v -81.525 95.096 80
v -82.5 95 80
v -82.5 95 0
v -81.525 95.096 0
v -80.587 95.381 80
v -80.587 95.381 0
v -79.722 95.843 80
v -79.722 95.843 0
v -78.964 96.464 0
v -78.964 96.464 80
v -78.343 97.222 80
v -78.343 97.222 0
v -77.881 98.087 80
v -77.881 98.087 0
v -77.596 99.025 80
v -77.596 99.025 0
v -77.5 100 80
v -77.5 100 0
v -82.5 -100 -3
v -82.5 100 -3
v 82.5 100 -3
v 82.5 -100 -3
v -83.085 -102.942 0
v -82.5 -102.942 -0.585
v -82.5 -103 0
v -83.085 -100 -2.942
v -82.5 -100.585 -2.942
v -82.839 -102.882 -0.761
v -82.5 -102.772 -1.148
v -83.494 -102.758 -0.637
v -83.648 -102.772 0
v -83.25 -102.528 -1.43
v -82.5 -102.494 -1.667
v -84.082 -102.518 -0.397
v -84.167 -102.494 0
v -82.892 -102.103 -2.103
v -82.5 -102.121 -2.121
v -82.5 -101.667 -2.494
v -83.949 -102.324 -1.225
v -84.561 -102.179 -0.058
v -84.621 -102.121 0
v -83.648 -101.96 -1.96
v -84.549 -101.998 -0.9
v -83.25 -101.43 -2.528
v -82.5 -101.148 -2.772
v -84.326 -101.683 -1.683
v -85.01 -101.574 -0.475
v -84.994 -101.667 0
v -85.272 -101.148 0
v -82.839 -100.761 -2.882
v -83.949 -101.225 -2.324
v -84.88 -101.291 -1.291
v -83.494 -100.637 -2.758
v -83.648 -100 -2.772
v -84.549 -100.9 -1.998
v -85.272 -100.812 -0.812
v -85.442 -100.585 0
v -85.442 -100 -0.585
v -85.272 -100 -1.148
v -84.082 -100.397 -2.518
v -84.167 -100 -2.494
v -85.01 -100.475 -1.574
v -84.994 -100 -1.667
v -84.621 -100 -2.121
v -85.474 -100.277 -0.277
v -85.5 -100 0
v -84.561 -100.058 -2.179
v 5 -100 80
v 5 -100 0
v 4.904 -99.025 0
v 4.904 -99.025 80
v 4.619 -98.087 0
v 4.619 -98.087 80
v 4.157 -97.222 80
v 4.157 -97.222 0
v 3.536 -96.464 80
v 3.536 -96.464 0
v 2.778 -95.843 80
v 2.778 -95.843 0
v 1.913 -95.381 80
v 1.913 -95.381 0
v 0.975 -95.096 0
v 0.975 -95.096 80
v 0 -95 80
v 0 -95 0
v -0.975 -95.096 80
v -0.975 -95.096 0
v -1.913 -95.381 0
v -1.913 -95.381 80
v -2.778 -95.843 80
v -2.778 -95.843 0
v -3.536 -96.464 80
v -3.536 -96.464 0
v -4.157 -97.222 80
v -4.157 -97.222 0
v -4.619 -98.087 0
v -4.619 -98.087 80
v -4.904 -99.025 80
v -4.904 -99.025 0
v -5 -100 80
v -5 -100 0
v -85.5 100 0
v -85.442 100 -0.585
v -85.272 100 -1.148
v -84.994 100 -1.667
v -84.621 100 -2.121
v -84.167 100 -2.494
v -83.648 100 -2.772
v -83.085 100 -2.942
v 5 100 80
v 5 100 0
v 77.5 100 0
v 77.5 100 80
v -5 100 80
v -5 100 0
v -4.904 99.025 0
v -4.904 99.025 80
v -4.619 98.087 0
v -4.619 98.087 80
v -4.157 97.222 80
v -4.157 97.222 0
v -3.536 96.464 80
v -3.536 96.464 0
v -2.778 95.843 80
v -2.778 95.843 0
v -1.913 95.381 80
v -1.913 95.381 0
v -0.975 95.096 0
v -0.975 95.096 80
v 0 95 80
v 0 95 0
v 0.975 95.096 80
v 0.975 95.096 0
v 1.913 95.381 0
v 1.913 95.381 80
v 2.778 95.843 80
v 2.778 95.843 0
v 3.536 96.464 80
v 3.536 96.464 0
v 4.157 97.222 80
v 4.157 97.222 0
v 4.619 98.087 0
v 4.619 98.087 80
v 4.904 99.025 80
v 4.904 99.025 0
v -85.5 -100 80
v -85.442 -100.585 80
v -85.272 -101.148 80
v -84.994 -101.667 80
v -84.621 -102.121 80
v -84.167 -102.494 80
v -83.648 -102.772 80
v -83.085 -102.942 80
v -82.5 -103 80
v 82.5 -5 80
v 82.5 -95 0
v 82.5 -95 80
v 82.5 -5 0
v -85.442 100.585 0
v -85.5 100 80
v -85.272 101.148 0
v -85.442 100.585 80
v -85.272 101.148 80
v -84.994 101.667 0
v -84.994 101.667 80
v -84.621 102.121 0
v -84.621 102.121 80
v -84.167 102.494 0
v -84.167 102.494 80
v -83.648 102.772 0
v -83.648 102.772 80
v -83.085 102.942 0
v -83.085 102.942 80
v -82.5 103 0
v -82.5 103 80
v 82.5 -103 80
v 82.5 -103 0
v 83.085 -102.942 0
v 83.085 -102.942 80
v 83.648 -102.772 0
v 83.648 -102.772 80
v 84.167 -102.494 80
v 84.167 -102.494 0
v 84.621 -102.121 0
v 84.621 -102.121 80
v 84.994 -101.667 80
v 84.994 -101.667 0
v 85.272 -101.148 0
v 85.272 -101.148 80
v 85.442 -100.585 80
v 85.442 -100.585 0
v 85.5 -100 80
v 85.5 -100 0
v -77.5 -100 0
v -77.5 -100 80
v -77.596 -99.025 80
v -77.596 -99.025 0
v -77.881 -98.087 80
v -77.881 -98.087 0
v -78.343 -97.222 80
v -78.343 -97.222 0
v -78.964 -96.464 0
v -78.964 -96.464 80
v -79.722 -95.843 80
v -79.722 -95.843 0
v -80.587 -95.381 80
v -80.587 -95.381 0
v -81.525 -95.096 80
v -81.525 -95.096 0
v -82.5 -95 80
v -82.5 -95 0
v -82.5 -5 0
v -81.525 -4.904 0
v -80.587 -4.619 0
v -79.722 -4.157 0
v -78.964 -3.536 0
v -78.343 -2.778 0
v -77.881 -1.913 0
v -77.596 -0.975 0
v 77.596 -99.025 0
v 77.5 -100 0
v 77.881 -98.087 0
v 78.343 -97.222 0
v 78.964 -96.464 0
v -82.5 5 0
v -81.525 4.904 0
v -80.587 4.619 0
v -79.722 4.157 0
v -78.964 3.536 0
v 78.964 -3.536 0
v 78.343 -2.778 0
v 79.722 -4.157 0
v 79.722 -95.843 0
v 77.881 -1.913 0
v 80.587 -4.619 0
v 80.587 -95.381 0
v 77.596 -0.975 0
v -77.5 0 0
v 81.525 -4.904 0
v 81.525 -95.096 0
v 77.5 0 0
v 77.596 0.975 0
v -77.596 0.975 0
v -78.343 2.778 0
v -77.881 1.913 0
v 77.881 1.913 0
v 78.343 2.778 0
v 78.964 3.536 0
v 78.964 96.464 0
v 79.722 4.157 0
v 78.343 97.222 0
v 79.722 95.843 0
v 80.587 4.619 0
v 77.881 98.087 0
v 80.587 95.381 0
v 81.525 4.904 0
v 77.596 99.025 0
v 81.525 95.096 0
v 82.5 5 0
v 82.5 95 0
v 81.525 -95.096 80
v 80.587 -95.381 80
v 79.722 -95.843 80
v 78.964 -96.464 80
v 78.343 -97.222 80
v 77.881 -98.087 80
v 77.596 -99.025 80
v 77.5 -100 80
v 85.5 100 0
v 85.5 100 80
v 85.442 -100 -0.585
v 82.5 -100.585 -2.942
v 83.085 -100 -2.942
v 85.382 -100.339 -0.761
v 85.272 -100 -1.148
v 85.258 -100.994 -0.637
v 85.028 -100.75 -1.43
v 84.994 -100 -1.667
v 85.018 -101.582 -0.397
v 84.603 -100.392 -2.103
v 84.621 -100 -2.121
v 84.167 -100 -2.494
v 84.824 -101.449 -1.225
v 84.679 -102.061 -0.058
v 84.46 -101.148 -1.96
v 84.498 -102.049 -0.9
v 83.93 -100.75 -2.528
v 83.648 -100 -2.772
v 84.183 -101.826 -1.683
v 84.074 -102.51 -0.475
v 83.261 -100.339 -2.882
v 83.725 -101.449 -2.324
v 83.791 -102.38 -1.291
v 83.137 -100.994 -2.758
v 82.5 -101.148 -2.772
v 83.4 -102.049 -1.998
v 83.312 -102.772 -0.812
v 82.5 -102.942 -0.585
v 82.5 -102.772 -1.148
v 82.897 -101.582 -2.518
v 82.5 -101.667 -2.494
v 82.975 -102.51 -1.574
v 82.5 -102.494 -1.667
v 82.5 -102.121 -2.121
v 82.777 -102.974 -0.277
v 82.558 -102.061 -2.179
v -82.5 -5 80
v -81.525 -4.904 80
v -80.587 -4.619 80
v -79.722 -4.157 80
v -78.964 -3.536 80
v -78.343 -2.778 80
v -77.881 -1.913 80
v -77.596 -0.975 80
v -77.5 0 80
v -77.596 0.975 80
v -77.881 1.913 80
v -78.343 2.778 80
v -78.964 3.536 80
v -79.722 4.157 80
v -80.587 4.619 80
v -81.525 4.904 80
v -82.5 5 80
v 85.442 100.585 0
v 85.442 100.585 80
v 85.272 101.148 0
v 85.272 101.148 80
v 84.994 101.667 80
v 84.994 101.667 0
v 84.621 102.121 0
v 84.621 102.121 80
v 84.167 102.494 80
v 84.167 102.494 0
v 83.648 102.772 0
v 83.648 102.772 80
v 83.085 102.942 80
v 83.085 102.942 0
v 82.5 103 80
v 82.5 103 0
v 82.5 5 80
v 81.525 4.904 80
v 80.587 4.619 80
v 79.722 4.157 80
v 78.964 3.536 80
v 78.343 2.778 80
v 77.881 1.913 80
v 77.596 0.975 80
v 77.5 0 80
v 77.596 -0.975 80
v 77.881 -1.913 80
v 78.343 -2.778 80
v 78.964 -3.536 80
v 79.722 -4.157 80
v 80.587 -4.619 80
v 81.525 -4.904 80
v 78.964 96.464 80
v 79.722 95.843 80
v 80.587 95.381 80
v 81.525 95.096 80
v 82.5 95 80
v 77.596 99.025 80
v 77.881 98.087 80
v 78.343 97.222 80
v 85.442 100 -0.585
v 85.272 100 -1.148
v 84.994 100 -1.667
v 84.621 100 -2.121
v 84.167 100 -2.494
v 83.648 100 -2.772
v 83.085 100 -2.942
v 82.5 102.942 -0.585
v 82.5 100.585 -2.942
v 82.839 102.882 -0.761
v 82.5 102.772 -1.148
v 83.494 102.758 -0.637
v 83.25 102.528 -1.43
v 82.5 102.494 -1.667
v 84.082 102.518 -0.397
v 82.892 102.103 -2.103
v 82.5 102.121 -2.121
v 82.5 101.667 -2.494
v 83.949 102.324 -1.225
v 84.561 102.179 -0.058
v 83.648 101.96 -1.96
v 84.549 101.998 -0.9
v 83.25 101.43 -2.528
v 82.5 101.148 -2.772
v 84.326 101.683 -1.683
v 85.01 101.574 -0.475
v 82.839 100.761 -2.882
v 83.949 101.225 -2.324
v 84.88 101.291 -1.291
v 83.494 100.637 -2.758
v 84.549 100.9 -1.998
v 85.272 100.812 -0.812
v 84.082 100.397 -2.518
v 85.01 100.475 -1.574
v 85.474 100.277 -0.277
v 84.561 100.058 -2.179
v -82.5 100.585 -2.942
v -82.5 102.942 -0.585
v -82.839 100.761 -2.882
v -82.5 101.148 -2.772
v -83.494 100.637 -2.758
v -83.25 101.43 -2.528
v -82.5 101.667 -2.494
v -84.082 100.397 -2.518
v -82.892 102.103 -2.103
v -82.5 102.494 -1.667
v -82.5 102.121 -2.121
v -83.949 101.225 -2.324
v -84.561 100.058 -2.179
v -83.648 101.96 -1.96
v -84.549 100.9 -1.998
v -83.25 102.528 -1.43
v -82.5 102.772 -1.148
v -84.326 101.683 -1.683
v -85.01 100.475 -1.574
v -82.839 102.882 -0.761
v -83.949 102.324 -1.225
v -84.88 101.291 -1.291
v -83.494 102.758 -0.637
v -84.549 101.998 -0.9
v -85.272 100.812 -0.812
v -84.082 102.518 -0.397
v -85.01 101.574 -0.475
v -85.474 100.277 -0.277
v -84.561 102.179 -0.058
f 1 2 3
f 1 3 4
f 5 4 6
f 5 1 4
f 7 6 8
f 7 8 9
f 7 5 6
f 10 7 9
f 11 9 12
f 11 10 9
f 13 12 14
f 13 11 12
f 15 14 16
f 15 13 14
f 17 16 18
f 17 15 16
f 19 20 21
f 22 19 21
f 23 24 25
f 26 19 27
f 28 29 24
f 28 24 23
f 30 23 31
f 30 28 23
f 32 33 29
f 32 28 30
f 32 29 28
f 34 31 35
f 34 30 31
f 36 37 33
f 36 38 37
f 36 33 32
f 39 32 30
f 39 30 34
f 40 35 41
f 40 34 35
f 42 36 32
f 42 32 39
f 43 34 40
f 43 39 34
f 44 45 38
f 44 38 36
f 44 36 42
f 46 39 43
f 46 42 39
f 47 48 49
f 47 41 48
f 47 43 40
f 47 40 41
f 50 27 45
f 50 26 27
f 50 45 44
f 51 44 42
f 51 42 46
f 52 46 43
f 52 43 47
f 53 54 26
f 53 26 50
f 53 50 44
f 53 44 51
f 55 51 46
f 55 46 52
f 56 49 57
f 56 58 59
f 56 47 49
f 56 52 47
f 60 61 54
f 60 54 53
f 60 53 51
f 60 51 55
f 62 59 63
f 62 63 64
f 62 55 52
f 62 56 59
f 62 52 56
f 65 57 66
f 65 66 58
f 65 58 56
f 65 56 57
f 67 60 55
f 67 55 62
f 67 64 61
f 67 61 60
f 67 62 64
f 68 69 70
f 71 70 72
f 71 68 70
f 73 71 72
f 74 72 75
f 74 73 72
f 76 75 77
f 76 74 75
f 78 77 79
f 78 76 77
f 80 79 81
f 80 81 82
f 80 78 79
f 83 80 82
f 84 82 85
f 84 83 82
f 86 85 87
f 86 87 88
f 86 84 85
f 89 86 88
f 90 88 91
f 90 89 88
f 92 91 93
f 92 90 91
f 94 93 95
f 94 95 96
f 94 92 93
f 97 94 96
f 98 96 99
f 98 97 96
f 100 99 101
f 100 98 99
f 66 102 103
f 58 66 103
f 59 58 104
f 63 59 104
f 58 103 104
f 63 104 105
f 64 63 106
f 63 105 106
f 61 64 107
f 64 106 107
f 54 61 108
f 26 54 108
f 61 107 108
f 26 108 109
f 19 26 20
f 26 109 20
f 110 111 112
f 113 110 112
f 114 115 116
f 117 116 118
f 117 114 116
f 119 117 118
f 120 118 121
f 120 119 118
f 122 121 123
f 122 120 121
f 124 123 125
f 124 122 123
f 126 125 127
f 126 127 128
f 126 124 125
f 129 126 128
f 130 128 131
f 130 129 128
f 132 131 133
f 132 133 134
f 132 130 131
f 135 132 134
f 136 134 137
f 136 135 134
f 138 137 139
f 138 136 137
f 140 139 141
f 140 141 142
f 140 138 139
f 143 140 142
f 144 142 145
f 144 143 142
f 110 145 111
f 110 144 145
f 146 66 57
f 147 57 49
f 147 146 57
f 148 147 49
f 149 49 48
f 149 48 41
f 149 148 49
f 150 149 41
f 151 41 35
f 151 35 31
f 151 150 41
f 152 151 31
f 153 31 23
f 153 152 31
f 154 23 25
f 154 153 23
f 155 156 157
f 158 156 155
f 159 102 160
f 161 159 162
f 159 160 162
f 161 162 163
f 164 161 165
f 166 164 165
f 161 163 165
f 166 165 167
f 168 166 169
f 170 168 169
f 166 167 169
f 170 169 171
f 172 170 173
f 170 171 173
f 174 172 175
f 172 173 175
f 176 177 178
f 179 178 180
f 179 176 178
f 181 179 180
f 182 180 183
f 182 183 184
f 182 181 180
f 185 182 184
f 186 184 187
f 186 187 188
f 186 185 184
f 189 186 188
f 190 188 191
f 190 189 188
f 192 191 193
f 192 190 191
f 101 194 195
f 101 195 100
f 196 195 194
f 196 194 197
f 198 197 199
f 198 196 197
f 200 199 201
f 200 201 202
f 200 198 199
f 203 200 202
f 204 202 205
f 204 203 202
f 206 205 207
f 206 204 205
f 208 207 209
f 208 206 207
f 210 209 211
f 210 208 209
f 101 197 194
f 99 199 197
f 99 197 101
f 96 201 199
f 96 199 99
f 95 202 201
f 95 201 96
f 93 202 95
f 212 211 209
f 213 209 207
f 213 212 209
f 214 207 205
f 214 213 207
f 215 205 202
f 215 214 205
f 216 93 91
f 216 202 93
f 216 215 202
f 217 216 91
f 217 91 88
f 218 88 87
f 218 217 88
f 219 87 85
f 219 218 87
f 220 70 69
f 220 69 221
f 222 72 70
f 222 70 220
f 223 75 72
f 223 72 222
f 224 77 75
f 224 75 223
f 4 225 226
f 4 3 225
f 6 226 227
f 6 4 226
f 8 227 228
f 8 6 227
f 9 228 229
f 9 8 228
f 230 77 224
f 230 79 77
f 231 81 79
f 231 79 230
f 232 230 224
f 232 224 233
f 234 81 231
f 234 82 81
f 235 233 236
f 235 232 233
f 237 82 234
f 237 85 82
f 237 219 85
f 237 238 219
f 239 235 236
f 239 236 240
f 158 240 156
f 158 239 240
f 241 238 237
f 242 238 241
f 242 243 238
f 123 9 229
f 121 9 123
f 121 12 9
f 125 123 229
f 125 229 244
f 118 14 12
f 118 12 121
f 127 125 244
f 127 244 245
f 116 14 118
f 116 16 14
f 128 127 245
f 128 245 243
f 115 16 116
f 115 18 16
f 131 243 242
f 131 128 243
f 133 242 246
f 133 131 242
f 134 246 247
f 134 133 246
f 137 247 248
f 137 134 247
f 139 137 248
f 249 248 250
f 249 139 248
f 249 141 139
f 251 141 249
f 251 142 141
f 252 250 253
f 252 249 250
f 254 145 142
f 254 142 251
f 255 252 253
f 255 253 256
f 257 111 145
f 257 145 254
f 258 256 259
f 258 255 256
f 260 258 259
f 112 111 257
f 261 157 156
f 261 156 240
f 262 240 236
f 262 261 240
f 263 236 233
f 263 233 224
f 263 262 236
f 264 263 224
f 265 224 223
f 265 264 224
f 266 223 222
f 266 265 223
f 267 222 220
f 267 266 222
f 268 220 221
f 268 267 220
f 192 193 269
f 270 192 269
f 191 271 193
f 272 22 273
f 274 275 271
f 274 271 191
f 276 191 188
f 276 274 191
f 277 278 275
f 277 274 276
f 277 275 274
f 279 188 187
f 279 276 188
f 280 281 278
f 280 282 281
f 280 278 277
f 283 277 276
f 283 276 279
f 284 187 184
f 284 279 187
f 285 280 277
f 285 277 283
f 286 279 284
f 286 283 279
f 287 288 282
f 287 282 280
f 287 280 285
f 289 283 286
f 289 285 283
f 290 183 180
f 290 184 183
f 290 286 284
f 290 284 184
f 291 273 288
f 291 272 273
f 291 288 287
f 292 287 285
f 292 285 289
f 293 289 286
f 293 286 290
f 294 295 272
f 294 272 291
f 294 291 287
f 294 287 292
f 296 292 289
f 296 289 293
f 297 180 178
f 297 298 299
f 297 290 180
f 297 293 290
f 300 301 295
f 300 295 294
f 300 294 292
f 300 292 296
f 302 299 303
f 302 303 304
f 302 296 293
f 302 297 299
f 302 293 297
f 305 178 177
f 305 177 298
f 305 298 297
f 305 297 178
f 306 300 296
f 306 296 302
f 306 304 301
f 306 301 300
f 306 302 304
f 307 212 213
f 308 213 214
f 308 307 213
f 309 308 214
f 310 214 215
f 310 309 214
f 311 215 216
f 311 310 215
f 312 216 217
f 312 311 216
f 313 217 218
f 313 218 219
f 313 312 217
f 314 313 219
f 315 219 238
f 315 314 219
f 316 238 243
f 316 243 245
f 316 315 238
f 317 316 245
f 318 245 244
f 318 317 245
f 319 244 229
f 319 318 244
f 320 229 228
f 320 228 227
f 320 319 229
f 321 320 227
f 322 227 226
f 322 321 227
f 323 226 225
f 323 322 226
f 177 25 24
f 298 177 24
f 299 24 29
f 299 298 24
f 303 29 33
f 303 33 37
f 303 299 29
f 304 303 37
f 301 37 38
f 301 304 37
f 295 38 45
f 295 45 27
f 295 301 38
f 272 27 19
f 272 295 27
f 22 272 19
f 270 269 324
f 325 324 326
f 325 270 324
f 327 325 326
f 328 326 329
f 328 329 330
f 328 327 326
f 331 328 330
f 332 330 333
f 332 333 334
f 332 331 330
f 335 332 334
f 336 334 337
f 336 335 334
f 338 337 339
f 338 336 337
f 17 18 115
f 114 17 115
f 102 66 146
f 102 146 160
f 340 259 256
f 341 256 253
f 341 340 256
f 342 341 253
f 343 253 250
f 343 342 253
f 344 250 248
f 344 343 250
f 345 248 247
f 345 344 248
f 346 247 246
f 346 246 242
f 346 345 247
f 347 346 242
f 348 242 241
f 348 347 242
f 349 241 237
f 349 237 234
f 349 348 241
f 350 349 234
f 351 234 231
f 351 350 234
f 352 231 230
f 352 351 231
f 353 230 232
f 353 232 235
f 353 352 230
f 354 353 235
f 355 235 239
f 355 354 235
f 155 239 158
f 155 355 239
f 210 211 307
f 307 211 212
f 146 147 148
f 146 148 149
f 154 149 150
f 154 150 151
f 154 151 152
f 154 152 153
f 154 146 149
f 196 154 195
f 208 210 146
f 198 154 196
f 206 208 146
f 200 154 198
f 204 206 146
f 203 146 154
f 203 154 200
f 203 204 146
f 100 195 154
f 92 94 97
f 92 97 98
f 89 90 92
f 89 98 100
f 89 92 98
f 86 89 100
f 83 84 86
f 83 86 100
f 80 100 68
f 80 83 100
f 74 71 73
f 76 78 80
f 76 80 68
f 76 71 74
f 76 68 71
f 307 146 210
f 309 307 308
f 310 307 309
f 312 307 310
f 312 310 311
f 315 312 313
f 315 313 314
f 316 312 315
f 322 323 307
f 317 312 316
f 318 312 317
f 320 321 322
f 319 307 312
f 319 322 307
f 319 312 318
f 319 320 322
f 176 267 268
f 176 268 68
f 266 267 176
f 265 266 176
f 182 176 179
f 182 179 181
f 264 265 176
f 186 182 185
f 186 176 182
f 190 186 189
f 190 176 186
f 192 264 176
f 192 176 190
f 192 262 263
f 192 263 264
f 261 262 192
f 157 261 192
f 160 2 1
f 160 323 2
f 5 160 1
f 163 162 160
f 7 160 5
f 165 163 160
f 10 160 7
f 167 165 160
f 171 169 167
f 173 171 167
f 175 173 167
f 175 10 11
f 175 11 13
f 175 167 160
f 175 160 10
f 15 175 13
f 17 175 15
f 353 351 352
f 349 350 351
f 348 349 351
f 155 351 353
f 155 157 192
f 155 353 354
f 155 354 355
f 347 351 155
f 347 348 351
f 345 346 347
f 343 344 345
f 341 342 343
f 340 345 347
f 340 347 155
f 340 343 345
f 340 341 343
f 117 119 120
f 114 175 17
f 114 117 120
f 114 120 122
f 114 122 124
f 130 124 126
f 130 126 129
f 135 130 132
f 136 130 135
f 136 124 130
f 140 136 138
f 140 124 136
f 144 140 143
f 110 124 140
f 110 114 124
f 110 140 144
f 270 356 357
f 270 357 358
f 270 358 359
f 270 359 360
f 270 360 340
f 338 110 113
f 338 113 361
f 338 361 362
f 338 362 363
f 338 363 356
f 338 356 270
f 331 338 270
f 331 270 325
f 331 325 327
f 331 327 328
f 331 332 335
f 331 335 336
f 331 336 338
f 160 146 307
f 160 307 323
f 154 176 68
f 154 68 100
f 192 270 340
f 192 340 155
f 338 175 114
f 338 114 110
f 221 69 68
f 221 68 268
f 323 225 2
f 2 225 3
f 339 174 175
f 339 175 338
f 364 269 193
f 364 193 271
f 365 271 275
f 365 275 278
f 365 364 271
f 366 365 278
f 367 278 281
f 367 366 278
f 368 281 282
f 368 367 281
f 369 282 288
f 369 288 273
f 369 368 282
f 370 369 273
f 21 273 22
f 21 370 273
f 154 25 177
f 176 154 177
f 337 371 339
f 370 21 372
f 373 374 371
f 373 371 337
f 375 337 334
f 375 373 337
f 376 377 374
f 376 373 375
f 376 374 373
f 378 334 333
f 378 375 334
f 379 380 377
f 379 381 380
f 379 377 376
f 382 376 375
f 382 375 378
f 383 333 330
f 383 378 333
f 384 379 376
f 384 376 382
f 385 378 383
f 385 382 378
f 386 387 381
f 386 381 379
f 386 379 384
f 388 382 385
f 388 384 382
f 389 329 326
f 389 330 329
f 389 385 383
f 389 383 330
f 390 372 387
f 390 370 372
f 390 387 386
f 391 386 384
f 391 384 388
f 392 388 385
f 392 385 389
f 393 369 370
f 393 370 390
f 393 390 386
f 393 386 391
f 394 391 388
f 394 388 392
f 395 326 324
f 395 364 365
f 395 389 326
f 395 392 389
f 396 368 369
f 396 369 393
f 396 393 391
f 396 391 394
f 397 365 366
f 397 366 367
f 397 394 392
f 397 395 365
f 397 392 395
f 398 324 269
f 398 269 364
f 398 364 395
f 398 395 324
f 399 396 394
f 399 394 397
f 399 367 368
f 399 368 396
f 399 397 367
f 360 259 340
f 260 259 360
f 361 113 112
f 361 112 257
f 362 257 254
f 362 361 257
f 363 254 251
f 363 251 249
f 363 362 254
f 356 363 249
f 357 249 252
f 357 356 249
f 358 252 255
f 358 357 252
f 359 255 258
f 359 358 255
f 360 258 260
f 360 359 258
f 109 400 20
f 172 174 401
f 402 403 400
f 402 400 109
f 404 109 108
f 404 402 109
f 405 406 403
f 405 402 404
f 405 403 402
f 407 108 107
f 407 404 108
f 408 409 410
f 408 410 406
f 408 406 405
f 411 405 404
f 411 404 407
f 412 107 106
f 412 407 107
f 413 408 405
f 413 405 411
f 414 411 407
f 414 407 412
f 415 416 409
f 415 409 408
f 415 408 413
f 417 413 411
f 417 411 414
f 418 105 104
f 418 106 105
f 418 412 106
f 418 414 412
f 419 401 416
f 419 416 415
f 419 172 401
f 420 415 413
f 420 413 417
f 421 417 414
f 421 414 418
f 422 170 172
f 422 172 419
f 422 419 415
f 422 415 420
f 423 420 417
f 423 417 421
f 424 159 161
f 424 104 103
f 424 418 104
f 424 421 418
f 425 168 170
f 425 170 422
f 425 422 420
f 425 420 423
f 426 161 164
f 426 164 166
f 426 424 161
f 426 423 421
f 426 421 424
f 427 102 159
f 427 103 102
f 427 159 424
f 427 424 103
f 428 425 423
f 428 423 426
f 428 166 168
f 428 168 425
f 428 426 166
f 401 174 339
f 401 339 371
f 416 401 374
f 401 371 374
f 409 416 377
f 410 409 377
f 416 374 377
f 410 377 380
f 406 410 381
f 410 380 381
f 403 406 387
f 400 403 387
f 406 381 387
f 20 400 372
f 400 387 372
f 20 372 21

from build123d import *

# Parameters (mm, degrees)
SKETCH002_W  = 165
SKETCH002_H  = 200
PAD_DEPTH    = 80
THICKNESS_T  = 3
PAD004_DEPTH = 80


with BuildPart() as part:
    # Sketch002 → Pad (new body)
    with BuildSketch(Plane.XY):
        Rectangle(SKETCH002_W, SKETCH002_H)
    extrude(amount=PAD_DEPTH)

    # Thickness
    thickness_openings = [part.faces().sort_by_distance(p)[0] for p in [
        (0, 0, 80),
    ]]
    offset(amount=THICKNESS_T, openings=thickness_openings)

    # Sketch006 → Pad004 (join)
    with BuildSketch(Plane.XY.offset(80)):
        with BuildLine():
            ThreePointArc((-82.5, 95), (-78.964466, 96.464466), (-77.5, 100))
            Line((-82.5, 100), (-77.5, 100))
            Line((-82.5, 95), (-82.5, 100))
        make_face()
        with BuildLine():
            ThreePointArc((77.5, 100), (78.964466, 96.464466), (82.5, 95))
            Line((82.5, 100), (82.5, 95))
            Line((82.5, 100), (77.5, 100))
        make_face()
        with BuildLine():
            ThreePointArc((-77.5, -100), (-78.964466, -96.464466), (-82.5, -95))
            Line((-82.5, -100), (-82.5, -95))
            Line((-82.5, -100), (-77.5, -100))
        make_face()
        with BuildLine():
            ThreePointArc((82.5, -95), (78.964466, -96.464466), (77.5, -100))
            Line((77.5, -100), (82.5, -100))
            Line((82.5, -100), (82.5, -95))
        make_face()
        with BuildLine():
            ThreePointArc((5, -100), (0, -95), (-5, -100))
            Line((-5, -100), (5, -100))
        make_face()
        with BuildLine():
            ThreePointArc((-82.5, -5), (-77.5, 0), (-82.5, 5))
            Line((-82.5, 5), (-82.5, -5))
        make_face()
        with BuildLine():
            ThreePointArc((82.5, 5), (77.5, 0), (82.5, -5))
            Line((82.5, 5), (82.5, -5))
        make_face()
        with BuildLine():
            ThreePointArc((-5, 100), (0, 95), (5, 100))
            Line((-5, 100), (5, 100))
        make_face()
    extrude(amount=-PAD004_DEPTH)


solid = part.part
